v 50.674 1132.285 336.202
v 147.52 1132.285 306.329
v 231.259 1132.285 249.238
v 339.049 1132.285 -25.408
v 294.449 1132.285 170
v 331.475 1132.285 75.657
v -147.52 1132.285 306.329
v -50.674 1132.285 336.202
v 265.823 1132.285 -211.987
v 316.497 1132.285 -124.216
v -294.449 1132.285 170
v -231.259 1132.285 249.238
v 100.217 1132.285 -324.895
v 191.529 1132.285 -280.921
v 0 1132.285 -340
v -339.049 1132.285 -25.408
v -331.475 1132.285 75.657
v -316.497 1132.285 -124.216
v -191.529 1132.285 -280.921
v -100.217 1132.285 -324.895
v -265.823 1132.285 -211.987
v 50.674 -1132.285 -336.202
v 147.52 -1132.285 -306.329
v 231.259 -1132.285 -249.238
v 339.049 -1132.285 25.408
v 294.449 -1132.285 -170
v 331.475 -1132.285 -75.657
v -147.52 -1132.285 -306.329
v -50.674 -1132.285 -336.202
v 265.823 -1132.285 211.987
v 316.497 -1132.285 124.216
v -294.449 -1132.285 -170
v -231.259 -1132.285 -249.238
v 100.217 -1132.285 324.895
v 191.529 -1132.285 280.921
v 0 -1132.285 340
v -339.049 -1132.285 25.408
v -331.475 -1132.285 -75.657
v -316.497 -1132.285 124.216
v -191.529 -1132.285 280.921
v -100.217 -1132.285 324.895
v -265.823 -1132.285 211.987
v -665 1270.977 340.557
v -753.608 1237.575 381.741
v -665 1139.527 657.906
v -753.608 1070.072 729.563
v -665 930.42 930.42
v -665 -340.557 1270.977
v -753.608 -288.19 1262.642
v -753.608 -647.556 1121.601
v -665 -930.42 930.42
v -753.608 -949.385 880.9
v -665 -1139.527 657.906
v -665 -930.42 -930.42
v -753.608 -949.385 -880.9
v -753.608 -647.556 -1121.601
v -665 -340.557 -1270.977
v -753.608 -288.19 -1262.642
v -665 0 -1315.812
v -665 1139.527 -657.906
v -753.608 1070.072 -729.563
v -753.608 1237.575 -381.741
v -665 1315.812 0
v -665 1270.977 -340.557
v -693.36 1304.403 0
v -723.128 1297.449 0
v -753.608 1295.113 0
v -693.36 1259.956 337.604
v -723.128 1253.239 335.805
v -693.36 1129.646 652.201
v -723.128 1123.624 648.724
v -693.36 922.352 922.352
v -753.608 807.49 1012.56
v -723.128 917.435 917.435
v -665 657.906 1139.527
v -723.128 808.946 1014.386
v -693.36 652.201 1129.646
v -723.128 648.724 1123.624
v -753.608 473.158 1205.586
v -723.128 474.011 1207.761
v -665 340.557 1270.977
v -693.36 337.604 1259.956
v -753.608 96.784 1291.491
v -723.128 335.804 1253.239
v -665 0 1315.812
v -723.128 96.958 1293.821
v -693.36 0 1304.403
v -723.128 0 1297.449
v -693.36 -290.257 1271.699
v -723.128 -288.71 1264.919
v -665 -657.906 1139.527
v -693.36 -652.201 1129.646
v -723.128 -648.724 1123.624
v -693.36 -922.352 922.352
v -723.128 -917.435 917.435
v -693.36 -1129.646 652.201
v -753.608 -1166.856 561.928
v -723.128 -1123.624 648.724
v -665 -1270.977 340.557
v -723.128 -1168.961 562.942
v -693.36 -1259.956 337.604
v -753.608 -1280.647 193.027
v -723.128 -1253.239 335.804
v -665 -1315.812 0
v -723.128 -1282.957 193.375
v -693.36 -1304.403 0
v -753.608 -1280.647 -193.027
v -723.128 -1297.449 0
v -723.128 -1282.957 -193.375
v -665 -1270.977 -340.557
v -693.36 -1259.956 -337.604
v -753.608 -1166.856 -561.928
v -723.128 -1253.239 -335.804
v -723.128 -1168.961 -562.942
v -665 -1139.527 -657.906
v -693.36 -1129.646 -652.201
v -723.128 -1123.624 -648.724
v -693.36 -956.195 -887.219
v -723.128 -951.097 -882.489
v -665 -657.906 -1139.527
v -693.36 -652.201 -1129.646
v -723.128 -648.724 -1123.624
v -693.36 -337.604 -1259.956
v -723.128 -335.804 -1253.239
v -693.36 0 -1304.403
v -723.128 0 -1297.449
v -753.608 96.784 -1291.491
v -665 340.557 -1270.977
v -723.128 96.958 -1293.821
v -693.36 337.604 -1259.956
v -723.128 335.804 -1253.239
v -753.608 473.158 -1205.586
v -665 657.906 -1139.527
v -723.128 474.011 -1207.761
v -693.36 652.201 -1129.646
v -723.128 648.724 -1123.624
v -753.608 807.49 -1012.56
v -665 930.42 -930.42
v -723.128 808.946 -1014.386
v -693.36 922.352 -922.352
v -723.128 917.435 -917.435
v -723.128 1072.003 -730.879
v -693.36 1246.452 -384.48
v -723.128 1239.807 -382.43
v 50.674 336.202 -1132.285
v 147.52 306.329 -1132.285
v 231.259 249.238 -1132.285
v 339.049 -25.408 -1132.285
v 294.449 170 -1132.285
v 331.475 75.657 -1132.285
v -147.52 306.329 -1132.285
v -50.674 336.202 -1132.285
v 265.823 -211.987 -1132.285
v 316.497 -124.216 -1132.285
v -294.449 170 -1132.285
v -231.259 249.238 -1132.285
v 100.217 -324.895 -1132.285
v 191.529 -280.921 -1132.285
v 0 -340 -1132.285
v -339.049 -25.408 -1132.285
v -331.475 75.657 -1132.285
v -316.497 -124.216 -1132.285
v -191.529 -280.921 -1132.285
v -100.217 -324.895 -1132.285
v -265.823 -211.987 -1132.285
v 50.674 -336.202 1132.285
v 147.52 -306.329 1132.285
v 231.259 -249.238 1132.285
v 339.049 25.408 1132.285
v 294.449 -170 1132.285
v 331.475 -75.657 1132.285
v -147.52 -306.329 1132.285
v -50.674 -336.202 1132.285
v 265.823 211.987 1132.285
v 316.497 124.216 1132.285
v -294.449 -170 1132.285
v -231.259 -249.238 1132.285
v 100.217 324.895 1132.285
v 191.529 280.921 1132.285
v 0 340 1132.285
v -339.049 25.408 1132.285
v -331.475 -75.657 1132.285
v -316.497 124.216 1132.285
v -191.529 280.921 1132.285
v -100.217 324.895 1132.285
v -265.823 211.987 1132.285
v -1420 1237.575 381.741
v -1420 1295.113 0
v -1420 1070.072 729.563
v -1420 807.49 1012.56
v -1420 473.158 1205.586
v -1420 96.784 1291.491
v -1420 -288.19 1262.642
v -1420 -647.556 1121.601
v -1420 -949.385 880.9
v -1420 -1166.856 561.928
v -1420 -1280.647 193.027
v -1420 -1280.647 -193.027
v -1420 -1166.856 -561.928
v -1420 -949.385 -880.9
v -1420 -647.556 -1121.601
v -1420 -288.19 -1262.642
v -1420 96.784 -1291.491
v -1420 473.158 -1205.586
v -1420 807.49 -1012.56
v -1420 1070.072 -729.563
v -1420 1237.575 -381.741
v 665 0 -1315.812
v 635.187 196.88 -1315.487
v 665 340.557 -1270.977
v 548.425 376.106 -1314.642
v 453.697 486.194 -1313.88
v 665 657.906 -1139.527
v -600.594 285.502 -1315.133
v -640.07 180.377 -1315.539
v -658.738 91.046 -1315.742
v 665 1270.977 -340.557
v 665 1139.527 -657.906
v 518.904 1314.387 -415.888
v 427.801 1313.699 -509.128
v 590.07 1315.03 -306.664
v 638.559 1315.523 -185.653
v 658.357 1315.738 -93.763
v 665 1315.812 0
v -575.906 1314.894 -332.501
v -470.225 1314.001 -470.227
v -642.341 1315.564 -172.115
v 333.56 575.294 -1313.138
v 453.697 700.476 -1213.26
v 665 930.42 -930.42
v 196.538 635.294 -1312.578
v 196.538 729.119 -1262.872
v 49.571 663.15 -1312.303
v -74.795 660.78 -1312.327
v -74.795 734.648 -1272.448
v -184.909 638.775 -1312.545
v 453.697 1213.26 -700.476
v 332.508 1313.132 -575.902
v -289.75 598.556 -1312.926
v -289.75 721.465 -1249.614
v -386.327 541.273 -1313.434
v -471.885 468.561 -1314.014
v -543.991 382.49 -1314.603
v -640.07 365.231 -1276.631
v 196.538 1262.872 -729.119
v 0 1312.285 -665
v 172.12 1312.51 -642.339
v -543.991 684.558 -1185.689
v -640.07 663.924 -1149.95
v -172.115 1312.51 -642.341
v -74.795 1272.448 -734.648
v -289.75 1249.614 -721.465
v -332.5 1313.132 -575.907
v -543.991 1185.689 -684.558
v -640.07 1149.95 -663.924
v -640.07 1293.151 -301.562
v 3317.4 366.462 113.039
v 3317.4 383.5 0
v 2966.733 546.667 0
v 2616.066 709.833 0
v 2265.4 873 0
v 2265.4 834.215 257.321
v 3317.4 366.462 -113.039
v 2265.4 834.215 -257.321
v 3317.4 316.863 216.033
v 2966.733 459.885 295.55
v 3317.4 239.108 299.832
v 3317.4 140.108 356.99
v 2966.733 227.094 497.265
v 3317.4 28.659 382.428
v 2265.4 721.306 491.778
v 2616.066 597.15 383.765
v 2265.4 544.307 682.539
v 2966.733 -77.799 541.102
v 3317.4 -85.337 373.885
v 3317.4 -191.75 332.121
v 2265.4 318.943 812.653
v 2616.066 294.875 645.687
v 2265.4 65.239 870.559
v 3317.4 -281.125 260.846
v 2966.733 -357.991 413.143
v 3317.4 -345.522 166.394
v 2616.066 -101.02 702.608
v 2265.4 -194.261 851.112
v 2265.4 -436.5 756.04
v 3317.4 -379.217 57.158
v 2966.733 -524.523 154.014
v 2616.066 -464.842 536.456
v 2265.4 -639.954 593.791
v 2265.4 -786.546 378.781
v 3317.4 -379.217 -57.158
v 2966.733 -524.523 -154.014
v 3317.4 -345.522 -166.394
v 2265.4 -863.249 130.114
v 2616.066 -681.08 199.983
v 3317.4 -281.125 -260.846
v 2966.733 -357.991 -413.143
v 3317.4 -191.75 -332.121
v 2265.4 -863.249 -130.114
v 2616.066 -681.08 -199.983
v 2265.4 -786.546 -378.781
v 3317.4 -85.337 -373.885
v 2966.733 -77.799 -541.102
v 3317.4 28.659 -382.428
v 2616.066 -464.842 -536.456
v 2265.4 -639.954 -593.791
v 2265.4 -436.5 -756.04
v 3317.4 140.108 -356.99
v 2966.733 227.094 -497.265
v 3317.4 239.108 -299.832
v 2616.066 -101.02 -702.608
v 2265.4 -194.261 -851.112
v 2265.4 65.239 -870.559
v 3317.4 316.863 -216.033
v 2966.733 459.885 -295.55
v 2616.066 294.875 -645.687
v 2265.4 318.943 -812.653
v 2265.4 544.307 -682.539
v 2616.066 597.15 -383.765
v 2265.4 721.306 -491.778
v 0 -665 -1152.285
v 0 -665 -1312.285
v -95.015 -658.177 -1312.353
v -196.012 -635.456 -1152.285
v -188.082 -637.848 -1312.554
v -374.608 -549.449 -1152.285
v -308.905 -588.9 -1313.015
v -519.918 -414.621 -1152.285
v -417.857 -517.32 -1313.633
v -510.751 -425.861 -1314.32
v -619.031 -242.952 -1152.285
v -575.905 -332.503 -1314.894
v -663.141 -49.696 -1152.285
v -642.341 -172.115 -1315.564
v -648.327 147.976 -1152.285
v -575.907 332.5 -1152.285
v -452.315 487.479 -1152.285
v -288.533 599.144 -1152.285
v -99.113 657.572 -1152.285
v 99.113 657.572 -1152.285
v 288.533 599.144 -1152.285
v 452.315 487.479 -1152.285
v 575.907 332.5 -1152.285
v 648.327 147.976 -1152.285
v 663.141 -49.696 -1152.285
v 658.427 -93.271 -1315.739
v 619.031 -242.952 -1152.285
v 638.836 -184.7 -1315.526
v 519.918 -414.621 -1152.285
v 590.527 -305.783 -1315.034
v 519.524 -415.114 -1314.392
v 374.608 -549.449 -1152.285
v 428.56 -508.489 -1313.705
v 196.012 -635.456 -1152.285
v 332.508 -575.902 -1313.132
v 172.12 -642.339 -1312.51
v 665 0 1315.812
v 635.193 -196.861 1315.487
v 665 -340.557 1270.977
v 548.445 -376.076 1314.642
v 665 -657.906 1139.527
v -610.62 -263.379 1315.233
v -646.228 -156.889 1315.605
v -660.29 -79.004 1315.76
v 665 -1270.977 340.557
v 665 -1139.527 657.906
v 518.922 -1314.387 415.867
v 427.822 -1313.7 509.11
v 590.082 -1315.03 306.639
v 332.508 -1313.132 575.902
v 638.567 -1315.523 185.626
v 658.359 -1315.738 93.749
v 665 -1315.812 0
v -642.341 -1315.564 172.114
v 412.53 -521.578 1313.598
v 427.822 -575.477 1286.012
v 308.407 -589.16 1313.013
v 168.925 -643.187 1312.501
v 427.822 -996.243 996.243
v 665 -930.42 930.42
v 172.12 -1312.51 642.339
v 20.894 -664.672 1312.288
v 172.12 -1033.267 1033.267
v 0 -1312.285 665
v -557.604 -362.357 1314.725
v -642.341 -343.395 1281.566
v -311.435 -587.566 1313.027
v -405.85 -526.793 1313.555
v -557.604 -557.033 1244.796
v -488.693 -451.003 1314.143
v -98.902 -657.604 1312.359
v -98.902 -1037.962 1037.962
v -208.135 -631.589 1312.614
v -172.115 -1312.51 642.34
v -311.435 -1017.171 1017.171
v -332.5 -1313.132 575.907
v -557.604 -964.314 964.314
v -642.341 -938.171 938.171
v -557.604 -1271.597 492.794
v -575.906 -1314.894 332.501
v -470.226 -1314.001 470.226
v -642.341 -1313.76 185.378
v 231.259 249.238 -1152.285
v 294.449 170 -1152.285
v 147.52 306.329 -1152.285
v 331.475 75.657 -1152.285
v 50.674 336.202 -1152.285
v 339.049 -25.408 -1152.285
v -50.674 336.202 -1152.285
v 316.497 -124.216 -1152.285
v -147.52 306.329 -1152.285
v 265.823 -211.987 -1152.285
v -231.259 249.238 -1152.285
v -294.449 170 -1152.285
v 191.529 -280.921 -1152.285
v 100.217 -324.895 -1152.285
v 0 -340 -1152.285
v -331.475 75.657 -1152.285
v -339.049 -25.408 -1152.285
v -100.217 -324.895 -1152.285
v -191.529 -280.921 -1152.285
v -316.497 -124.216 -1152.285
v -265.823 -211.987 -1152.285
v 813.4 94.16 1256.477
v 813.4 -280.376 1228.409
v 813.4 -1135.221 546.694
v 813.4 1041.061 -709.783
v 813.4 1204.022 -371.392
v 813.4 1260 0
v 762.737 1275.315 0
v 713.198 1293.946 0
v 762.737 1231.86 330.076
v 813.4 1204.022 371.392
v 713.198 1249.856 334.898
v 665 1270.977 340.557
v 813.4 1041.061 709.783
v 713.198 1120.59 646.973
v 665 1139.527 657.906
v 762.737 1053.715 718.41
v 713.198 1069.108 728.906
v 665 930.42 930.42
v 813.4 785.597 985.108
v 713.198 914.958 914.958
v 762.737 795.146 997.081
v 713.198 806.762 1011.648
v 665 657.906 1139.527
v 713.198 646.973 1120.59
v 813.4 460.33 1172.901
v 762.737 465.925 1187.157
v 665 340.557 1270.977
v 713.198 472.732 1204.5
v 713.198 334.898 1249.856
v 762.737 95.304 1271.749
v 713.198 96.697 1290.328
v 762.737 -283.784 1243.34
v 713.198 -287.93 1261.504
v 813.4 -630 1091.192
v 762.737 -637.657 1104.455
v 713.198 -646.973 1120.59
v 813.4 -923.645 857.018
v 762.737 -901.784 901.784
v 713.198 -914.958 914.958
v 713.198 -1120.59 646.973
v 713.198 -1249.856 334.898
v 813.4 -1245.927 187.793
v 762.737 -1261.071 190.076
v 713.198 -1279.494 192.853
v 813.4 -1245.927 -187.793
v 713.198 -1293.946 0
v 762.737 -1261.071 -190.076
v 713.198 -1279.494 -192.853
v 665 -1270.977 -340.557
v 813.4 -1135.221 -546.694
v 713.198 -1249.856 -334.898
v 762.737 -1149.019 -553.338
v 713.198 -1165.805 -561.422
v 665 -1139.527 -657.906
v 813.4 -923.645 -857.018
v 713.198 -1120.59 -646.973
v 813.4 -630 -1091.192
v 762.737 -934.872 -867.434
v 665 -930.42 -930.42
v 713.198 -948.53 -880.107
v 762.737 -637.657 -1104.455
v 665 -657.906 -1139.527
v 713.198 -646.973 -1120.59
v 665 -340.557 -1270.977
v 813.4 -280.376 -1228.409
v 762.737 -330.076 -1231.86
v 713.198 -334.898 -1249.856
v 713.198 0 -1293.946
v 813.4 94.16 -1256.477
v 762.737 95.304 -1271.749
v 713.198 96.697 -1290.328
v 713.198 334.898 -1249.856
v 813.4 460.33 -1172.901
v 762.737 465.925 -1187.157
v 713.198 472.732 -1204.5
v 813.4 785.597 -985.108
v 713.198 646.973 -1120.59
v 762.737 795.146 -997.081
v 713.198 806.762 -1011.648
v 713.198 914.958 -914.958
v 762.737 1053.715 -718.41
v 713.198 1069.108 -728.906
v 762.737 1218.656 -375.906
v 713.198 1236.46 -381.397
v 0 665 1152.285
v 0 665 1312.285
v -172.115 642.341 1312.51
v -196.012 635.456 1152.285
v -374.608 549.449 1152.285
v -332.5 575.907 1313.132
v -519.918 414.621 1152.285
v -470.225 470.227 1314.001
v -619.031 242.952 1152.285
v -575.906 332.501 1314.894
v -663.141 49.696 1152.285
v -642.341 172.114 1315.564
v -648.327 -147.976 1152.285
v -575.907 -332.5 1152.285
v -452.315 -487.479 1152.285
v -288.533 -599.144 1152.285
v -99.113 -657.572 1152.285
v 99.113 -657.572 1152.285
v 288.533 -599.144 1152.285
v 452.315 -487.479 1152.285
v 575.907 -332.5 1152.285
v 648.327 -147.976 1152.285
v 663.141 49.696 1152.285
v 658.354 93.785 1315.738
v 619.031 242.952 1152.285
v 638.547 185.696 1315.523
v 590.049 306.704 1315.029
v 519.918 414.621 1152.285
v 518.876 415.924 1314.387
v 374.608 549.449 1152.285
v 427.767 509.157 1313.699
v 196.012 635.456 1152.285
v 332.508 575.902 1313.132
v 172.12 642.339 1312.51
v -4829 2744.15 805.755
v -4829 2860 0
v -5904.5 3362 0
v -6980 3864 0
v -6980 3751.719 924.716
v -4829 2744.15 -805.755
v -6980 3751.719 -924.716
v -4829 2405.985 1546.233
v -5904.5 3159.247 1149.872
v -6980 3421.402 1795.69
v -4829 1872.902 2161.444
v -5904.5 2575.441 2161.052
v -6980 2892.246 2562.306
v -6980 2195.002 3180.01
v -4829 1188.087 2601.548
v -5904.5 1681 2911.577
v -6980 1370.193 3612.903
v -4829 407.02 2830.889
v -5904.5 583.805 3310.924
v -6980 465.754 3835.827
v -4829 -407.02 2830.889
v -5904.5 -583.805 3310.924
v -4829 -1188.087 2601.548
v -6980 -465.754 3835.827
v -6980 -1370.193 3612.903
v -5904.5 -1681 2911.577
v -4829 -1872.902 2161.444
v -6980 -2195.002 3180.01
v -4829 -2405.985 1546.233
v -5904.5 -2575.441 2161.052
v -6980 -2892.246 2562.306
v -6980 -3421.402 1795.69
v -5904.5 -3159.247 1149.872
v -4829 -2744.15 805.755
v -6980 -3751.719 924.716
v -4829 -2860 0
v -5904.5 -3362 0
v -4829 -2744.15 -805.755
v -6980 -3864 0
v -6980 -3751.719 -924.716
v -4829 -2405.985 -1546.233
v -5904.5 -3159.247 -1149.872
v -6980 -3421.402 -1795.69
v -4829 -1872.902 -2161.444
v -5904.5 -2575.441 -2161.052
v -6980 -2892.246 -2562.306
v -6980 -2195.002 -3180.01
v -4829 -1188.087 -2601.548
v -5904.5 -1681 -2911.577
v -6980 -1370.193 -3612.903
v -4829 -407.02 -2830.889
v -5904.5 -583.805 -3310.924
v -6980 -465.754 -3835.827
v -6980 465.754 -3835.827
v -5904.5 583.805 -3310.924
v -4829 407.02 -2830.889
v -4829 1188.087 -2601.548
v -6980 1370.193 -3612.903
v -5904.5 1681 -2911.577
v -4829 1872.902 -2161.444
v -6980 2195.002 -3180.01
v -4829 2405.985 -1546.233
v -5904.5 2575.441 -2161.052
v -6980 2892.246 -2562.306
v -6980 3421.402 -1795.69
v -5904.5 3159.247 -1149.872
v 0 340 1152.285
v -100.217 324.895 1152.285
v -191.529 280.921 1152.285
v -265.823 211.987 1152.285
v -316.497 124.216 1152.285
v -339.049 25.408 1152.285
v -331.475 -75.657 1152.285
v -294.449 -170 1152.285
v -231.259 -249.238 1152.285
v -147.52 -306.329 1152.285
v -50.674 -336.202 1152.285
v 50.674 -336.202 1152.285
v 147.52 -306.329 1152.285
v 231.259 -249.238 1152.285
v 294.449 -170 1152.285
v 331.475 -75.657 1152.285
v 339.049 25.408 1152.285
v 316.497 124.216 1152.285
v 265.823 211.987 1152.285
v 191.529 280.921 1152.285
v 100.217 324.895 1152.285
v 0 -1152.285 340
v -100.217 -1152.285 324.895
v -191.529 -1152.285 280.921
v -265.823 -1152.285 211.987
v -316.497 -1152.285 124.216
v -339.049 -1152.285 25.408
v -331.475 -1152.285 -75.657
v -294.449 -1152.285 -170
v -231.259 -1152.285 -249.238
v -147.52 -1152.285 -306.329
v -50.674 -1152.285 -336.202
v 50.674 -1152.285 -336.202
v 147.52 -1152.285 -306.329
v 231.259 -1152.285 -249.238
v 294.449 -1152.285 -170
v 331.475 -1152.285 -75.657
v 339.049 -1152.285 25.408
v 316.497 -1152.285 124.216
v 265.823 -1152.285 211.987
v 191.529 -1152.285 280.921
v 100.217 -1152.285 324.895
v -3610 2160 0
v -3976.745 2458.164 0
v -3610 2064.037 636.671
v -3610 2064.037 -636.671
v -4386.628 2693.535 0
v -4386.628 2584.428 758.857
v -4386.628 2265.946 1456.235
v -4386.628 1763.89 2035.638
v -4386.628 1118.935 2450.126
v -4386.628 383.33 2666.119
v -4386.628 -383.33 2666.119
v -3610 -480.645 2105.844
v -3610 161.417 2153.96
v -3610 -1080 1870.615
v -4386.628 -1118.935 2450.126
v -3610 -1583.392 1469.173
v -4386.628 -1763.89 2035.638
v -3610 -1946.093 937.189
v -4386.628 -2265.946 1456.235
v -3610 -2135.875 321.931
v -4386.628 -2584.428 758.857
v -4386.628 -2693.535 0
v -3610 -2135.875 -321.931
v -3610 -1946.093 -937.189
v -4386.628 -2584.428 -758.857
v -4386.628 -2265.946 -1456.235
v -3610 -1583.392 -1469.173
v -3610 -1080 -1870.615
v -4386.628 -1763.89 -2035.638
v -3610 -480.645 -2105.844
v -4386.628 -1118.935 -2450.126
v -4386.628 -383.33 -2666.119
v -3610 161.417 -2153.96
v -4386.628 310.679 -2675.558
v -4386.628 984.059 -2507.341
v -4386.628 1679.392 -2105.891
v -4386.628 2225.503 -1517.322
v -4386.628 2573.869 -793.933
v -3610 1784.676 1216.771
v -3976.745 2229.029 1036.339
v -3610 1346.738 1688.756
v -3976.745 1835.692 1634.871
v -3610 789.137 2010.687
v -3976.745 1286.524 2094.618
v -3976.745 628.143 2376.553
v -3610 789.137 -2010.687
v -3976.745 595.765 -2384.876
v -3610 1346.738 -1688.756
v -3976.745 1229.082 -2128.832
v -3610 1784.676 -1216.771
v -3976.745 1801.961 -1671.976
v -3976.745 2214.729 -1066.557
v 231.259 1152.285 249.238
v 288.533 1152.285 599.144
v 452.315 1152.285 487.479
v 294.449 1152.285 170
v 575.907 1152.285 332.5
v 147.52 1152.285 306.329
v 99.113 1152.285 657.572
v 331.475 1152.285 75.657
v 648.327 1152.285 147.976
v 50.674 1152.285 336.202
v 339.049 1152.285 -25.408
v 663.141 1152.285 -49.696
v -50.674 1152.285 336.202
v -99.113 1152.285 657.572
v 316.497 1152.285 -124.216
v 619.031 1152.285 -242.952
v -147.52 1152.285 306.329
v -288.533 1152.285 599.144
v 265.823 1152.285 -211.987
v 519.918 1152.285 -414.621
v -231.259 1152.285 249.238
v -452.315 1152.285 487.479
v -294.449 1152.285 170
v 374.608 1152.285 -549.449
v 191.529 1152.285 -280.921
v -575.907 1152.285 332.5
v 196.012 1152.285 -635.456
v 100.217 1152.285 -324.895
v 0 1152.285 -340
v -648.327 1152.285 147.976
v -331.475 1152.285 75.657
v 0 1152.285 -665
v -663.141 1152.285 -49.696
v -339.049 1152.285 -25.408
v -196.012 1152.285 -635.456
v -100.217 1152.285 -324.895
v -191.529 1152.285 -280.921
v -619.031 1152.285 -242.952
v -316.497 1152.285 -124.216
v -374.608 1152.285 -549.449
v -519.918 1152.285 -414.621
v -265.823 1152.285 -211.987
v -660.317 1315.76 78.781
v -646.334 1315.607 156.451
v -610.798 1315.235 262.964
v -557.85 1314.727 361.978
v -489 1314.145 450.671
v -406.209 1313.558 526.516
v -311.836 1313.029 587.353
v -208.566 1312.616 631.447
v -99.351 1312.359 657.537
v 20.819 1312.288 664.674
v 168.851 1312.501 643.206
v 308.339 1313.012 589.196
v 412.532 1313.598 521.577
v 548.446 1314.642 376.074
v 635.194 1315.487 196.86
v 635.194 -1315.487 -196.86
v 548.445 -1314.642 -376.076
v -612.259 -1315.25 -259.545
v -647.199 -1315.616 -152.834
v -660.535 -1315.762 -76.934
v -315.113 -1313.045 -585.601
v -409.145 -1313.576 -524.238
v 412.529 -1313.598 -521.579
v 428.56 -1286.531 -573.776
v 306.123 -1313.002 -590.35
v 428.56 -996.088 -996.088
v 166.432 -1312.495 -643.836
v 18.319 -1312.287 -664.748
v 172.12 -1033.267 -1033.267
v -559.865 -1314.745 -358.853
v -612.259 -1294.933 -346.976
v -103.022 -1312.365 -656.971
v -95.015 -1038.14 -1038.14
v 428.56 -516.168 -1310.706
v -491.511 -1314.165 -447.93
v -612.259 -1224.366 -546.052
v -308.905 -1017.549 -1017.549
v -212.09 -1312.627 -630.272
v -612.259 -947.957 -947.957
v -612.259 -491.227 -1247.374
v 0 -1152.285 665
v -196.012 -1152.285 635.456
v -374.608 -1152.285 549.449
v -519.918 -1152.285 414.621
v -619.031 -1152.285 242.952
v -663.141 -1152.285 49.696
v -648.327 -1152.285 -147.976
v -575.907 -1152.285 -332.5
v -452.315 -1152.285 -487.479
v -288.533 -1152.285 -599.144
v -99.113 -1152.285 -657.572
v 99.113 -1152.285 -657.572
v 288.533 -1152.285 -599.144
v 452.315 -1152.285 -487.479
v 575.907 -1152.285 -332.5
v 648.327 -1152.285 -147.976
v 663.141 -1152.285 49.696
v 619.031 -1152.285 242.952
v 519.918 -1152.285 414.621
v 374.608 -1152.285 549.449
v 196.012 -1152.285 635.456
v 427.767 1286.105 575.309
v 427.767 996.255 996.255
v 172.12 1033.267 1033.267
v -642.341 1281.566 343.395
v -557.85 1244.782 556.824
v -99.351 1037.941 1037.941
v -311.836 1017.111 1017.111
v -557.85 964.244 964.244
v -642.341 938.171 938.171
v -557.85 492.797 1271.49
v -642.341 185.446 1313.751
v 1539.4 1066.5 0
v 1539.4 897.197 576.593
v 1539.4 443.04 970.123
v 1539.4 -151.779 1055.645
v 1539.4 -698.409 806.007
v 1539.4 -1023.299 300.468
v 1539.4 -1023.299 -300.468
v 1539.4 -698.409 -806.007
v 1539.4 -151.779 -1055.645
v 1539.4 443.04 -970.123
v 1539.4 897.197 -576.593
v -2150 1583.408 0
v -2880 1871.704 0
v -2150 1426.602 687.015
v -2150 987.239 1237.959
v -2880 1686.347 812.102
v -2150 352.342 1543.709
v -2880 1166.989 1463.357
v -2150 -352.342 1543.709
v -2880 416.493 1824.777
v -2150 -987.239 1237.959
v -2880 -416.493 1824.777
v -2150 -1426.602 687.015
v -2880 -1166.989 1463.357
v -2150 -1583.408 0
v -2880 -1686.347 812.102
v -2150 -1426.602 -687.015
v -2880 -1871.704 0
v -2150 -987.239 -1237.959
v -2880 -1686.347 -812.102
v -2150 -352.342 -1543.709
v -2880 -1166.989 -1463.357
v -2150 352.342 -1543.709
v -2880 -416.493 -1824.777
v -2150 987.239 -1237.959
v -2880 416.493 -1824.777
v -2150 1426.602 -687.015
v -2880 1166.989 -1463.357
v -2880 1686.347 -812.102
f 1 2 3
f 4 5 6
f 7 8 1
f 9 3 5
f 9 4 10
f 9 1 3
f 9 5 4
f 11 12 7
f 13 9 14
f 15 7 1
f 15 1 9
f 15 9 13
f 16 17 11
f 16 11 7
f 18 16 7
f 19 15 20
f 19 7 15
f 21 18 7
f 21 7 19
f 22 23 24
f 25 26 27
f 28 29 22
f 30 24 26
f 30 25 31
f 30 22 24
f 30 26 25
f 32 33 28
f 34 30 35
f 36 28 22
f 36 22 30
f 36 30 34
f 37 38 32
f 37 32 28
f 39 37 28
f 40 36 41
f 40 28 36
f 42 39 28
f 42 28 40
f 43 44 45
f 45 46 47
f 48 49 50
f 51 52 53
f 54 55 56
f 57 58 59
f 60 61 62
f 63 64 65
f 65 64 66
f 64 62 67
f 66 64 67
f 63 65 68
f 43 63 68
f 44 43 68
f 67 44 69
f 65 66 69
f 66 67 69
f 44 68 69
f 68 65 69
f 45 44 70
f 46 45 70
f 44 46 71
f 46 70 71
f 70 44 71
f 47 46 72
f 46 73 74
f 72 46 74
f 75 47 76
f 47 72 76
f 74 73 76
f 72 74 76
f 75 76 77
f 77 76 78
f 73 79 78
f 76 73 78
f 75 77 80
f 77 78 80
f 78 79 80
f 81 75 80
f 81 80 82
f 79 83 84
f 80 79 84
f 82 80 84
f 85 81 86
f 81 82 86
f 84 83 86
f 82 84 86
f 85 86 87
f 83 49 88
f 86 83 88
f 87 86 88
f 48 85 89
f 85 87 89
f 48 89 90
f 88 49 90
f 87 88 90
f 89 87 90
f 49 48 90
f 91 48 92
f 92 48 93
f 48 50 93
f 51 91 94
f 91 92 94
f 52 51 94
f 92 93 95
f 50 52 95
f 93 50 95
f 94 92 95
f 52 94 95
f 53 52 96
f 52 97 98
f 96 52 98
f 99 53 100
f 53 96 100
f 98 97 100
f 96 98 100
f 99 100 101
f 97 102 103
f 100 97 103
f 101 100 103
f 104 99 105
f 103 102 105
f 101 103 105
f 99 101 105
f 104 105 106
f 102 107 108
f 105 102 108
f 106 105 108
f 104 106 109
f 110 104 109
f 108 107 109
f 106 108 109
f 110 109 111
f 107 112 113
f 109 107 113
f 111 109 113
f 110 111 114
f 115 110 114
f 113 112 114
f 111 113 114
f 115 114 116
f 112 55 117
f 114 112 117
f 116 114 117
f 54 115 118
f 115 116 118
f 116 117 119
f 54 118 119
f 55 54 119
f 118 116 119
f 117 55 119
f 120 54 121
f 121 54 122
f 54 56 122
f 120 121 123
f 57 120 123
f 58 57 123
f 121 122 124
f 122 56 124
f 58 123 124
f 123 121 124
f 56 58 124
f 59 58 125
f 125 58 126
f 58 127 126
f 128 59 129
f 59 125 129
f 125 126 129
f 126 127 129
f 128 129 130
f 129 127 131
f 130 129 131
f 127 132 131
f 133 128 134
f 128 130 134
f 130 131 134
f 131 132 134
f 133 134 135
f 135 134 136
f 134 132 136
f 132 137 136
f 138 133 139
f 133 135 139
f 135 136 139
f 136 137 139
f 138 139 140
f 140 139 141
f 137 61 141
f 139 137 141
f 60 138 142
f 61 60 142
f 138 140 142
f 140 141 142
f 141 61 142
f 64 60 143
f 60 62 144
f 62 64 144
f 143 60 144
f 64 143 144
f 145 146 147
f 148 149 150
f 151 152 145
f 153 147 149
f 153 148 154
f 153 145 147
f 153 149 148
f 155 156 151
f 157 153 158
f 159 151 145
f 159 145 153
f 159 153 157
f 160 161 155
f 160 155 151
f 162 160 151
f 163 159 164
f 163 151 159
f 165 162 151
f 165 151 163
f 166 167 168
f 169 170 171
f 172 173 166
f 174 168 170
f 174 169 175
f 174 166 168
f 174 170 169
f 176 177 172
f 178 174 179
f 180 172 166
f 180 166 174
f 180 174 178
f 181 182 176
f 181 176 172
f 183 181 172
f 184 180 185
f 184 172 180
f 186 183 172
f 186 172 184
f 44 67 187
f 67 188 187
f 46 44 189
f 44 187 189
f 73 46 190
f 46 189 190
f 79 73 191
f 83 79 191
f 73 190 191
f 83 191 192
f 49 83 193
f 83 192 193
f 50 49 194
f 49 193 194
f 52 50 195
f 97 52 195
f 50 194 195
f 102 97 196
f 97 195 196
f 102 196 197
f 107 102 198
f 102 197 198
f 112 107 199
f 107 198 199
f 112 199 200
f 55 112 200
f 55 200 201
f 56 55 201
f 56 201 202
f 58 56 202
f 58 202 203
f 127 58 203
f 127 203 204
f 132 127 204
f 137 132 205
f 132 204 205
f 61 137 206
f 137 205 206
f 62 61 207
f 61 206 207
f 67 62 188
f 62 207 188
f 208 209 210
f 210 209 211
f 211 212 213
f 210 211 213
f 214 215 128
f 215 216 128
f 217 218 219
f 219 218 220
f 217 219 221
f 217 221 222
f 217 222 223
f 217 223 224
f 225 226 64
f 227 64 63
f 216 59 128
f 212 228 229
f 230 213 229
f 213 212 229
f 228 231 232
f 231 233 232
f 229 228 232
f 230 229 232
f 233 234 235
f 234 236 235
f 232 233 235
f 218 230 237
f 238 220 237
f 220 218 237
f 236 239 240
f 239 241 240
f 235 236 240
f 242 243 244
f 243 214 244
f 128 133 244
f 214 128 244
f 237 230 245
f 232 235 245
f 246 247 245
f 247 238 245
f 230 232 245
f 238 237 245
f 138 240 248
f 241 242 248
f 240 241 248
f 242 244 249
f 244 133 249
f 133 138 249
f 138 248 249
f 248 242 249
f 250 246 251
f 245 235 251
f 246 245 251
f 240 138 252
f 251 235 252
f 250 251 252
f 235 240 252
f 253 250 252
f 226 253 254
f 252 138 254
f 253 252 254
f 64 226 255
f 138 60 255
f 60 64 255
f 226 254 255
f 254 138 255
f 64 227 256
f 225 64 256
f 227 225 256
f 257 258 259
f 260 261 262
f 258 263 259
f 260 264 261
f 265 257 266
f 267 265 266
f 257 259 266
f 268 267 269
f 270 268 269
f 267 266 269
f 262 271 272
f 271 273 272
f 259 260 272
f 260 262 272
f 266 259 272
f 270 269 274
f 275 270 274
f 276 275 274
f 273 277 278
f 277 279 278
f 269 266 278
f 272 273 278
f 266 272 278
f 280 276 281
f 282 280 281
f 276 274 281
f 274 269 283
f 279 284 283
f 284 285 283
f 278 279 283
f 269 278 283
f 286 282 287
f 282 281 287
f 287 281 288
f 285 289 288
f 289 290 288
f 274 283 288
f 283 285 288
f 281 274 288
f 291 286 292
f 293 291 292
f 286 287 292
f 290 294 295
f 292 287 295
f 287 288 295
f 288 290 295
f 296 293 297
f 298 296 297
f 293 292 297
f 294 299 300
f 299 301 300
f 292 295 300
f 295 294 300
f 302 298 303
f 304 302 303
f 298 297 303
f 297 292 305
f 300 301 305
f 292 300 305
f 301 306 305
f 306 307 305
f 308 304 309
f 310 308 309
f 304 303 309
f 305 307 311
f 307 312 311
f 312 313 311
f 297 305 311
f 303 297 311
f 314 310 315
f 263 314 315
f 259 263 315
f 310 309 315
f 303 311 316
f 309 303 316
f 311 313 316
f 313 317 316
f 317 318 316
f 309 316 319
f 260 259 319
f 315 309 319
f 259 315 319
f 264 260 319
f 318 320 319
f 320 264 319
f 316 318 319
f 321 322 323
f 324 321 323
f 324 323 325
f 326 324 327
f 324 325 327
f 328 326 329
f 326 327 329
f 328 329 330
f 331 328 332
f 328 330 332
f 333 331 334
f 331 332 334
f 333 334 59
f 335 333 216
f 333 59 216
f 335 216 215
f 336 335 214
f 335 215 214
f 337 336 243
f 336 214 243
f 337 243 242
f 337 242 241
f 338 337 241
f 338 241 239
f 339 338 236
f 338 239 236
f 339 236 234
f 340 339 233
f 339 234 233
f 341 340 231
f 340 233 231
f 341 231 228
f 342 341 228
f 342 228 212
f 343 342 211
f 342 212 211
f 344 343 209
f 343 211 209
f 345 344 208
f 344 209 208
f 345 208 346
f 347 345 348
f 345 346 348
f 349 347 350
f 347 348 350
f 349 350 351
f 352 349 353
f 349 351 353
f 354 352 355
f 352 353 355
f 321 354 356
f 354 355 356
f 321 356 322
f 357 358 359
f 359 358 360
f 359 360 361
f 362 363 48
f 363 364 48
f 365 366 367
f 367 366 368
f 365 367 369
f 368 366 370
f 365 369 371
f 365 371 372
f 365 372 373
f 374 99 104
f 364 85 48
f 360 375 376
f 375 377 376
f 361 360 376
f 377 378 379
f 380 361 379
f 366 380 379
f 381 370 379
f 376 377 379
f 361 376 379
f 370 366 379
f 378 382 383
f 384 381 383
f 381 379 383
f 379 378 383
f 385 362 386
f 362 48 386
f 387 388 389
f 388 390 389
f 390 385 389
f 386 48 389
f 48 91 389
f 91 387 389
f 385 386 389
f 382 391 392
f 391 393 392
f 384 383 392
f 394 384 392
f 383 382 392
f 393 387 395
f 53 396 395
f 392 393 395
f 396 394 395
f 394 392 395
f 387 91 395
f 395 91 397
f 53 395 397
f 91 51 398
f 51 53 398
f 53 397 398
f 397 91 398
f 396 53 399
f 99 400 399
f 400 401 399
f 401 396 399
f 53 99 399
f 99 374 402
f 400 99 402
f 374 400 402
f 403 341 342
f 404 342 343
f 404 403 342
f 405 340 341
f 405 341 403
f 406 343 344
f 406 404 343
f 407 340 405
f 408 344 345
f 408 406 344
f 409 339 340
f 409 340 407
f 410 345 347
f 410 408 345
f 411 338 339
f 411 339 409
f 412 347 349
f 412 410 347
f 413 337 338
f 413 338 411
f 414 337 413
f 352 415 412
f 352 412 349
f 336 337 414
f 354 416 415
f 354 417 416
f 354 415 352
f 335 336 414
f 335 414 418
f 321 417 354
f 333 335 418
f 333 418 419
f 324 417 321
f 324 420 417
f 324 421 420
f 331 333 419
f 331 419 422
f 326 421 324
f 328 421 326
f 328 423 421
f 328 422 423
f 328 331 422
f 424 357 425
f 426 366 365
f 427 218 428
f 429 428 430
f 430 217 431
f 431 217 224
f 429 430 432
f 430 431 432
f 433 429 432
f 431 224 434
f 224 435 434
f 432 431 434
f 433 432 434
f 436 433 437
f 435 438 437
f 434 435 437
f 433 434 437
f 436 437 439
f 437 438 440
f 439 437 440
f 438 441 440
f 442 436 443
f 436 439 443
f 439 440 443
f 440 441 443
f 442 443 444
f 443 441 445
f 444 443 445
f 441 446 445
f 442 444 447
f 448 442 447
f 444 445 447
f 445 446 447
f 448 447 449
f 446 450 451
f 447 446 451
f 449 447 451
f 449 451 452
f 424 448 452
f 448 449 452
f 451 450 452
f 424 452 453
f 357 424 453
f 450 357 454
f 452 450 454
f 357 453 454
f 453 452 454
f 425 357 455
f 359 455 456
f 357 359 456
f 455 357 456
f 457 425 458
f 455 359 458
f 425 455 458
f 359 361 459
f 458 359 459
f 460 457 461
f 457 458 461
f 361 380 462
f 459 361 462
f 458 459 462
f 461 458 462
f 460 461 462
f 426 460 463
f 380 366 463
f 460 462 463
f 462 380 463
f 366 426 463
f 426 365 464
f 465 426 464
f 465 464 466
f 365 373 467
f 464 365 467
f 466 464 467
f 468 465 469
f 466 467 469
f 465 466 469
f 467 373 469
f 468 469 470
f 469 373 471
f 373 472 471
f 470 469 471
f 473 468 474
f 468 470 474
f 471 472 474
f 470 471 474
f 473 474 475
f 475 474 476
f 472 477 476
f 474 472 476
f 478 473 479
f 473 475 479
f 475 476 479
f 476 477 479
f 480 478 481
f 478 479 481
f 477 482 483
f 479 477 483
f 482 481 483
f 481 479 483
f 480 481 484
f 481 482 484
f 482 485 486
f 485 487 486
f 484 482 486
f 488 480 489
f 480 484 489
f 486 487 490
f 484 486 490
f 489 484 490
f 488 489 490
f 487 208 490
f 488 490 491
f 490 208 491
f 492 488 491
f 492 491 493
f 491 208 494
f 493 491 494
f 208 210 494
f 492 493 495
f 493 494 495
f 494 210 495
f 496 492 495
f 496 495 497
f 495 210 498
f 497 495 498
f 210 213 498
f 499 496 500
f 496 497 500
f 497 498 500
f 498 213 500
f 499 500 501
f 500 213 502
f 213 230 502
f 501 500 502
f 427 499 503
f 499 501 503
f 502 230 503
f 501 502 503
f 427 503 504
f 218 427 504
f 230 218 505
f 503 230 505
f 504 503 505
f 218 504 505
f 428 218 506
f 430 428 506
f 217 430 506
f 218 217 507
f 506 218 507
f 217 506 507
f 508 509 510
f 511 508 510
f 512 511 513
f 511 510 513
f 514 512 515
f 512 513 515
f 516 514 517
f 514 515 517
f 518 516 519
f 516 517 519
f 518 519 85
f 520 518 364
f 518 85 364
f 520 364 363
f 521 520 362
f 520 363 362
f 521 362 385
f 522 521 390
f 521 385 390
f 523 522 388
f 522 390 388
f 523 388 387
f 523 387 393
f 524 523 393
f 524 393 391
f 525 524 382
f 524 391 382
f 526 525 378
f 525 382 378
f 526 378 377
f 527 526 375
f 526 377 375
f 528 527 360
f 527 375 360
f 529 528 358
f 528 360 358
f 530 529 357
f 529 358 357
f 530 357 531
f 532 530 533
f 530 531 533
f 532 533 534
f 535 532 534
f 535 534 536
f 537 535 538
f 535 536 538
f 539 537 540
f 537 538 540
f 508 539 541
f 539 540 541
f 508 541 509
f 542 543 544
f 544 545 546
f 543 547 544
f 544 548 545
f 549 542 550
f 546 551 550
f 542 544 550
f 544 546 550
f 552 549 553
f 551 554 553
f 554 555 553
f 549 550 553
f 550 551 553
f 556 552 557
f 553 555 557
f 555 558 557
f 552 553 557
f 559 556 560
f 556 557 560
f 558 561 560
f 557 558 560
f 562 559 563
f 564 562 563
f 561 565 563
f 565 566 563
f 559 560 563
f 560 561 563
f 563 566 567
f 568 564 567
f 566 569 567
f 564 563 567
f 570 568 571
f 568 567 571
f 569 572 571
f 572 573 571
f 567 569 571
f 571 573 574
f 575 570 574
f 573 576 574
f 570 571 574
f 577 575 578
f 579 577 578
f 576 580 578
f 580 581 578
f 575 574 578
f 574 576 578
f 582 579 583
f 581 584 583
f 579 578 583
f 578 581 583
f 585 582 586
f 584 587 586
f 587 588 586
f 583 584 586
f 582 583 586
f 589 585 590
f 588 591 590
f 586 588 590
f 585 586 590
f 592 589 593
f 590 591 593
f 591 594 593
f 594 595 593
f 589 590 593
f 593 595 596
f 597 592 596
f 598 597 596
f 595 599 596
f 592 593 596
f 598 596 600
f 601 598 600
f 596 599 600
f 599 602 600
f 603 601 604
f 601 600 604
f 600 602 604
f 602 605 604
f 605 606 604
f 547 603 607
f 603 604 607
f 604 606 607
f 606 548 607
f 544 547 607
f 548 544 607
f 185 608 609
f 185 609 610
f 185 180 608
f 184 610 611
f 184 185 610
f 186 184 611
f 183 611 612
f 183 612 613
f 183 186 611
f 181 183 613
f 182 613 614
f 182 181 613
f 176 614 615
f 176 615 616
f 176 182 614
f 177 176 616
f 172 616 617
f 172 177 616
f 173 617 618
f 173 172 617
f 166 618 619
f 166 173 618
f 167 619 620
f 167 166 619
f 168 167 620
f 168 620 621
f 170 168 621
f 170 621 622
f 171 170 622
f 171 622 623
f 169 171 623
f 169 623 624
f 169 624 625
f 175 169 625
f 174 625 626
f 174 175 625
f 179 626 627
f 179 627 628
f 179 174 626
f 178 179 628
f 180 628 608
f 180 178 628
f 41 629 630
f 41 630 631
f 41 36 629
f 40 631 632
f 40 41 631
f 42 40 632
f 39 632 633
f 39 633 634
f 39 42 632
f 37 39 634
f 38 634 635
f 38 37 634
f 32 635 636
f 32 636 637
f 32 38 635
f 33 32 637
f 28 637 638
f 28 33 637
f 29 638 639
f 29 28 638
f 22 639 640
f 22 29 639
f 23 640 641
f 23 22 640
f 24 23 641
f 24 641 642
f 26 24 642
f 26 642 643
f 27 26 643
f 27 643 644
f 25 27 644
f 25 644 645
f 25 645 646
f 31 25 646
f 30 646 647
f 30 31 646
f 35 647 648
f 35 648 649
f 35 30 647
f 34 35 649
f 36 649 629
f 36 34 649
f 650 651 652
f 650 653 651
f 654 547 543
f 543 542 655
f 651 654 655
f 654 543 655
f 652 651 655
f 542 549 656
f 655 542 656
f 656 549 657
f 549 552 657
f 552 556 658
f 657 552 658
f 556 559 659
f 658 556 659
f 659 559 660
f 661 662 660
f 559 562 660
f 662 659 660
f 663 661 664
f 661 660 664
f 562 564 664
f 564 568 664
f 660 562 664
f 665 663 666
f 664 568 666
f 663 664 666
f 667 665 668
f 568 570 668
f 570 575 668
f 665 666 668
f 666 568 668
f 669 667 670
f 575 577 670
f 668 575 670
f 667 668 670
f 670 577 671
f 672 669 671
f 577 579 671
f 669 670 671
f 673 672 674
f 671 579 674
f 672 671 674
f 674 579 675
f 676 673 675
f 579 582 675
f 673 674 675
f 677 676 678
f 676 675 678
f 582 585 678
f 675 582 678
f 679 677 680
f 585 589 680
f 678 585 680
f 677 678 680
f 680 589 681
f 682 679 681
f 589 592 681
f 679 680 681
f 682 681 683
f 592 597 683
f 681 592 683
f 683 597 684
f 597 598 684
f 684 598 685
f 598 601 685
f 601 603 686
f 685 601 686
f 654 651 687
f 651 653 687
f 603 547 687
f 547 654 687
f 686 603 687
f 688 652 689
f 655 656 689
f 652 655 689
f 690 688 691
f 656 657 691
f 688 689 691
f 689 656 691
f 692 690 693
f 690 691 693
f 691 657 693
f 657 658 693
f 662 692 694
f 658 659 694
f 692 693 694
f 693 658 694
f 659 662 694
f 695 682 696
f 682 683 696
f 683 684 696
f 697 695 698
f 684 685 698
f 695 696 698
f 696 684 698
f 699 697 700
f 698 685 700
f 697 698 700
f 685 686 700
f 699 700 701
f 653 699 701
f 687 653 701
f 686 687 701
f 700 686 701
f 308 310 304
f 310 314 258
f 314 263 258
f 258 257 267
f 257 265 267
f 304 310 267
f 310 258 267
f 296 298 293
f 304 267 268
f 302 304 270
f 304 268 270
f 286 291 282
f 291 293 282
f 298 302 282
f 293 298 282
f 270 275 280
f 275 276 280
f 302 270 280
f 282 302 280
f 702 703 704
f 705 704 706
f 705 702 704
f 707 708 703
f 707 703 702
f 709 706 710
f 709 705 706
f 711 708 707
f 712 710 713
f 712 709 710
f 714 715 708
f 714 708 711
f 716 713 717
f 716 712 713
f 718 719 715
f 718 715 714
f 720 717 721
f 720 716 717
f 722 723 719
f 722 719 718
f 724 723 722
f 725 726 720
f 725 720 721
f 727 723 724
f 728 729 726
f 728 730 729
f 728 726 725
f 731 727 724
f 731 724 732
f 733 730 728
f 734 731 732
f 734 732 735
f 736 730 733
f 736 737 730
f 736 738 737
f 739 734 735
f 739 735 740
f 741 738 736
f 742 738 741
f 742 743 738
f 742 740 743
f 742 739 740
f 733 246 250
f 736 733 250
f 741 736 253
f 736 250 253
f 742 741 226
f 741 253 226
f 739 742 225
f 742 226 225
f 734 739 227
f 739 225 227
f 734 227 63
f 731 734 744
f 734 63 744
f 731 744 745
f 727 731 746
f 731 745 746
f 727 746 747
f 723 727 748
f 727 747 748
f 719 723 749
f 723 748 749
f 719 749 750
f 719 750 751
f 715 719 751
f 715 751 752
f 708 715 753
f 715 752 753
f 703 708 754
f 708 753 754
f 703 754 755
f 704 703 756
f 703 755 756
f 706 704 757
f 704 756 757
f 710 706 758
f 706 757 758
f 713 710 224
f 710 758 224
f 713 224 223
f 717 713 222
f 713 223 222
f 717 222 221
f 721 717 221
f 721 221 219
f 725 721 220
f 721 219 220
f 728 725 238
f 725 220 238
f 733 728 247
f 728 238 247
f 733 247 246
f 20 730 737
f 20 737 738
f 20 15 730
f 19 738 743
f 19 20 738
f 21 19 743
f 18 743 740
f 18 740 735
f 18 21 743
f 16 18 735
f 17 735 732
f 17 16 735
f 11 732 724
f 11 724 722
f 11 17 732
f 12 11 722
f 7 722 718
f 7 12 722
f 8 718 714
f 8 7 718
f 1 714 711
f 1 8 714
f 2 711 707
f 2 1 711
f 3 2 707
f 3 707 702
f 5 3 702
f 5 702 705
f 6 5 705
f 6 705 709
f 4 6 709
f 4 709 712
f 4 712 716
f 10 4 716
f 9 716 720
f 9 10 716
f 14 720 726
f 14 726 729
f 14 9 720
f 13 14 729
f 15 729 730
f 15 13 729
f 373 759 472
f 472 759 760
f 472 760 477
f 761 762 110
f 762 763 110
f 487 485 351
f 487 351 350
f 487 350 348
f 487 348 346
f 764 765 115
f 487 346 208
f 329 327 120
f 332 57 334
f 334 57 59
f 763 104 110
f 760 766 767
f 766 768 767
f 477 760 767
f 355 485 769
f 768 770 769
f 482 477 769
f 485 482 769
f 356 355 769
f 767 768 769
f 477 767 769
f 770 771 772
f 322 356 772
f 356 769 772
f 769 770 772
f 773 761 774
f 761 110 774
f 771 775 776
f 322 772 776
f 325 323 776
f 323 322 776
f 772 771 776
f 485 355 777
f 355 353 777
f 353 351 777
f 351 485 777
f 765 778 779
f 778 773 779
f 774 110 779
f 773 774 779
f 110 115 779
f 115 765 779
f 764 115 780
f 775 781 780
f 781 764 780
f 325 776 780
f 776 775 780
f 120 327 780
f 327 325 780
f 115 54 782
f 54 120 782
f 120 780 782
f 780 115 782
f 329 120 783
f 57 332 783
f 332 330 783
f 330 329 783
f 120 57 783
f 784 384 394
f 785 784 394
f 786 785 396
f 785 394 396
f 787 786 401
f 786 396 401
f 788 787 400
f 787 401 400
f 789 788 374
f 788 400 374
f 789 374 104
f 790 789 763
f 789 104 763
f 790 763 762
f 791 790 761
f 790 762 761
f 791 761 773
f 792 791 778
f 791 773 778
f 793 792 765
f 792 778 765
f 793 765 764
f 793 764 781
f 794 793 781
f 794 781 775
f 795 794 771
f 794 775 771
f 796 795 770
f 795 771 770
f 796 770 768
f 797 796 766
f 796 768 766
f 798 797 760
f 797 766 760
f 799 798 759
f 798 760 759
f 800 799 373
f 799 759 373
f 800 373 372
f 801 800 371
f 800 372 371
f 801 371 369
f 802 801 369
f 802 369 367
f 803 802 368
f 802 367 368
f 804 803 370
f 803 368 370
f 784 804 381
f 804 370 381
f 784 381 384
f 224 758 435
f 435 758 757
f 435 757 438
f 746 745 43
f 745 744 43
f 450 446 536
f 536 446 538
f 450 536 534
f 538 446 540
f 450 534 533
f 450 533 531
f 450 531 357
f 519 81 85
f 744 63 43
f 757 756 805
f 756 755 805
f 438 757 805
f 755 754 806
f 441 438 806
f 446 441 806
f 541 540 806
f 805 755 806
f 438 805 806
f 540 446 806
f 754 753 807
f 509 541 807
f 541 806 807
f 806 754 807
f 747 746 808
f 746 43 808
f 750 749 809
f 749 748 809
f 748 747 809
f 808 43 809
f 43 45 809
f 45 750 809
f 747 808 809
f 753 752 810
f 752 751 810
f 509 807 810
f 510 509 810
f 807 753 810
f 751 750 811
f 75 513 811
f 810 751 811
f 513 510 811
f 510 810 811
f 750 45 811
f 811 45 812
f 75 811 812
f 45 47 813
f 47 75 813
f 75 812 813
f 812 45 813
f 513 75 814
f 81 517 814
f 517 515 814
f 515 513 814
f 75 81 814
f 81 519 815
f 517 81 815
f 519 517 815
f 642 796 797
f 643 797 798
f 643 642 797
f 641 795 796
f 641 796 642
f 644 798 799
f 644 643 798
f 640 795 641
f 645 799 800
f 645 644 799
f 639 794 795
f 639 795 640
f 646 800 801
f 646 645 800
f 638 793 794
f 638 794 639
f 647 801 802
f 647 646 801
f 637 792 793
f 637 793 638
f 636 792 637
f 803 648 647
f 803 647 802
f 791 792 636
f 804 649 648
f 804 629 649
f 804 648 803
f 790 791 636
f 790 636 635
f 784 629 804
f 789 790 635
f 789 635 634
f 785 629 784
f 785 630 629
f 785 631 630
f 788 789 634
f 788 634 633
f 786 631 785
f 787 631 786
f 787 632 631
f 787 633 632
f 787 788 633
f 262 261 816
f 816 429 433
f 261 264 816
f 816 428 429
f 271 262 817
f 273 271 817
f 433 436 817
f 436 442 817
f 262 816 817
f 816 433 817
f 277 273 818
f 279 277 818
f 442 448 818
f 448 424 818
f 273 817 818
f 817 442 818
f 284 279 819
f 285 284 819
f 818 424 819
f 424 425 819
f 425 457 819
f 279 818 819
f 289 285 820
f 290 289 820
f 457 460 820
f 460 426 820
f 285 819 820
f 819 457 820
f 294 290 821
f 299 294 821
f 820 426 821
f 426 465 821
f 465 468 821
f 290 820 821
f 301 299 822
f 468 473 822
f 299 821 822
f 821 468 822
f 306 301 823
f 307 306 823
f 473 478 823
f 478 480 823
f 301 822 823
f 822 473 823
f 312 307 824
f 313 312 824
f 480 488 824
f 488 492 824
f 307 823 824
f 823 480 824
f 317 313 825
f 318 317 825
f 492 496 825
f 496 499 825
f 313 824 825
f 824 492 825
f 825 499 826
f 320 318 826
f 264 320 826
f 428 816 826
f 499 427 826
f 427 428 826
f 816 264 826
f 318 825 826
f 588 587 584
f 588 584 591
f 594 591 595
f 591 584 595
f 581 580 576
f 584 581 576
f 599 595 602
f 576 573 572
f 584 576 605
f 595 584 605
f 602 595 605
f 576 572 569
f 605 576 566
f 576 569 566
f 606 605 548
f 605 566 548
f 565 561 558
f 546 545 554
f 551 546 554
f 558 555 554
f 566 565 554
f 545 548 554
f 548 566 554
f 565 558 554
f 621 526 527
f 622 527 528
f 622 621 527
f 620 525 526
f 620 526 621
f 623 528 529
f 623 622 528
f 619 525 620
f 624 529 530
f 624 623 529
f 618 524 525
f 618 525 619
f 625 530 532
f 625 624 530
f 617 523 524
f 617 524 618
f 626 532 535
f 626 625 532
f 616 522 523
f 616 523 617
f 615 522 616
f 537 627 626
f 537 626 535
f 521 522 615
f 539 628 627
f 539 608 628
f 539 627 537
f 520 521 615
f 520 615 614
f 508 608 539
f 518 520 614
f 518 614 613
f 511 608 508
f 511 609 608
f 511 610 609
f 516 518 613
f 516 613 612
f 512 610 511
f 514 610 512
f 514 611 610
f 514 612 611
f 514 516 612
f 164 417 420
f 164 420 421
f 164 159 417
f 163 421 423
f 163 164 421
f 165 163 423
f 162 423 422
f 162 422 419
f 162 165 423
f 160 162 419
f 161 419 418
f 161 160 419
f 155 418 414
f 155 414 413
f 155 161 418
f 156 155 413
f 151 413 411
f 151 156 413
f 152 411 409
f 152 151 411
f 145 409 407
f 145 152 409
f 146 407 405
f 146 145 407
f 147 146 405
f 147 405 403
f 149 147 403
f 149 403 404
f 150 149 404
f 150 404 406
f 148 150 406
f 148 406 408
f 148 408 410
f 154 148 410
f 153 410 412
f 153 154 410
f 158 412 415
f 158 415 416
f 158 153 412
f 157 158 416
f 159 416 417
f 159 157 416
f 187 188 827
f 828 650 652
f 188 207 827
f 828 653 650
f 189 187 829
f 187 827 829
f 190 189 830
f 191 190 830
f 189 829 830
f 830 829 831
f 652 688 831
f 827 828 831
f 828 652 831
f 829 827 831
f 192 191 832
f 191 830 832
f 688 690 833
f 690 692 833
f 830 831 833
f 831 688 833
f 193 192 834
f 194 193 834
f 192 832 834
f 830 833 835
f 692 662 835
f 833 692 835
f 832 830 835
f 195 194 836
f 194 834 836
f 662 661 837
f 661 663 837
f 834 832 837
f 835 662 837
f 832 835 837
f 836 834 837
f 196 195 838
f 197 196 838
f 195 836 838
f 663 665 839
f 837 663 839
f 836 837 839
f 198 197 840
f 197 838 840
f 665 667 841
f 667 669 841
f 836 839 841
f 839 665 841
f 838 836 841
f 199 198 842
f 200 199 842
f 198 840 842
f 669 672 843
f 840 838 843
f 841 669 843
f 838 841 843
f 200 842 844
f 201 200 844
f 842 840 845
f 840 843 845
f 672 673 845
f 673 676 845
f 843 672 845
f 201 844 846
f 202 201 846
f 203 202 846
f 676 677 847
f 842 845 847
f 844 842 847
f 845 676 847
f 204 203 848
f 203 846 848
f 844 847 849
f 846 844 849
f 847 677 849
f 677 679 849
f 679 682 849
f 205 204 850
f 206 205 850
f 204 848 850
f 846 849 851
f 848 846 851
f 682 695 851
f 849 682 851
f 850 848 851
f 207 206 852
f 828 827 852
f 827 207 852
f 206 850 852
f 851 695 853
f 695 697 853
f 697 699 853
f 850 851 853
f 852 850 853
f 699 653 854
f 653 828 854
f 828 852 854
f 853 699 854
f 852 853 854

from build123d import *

# Parameters (mm, degrees)
PADR_OCIRCULAR1_COUNT = 4


with BuildPart() as part:
    # Esboço1 → Revolução1 (revolve)
    with BuildSketch(Plane.XY):
        with BuildLine():
            Line((3317.399667889, 0), (3317.399667889, 383.5))
            Line((3317.399667889, 383.5), (2265.399667889, 873))
            Line((2265.399667889, 873), (813.399667889, 1260))
            ThreePointArc((813.399667889, 1260), (737.813781205, 1284.220696189), (665, 1315.812176946))
            ThreePointArc((665, 1315.812176946), (0, 1471.161405015), (-665, 1315.812176946))
            ThreePointArc((-665, 1315.812176946), (-708.110967822, 1300.356342101), (-753.607594937, 1295.112746158))
            Line((-753.607594937, 1295.112746158), (-1420, 1295.112746158))
            Line((-1420, 1295.112746158), (-3610, 2160))
            ThreePointArc((-3610, 2160), (-4176.936739119, 2584.120878591), (-4829, 2860))
            Line((-4829, 2860), (-6980, 3864))
            Line((-6980, 3864), (-6980, 0))
            Line((-6980, 0), (3317.399667889, 0))
        make_face()
    revolve(axis=Axis((-6980, 0, 0), (1, 0, 0)))

    # Esboço2 → Corte-Revolução7 (revolve, cut)
    with BuildSketch(Plane(origin=(0, 0, 0), x_dir=(0, 0, -1), z_dir=(1, 0, 0))):
        Polygon((665, 1312.284603127), (665, 1152.284603127), (340, 1152.284603127), (340, 1132.284603127), (0, 1132.284603127), (0, 1471.161405015), (0, 1794.497439154), (665, 1794.497439154), align=None)
    corte_revolu_o7 = revolve(axis=Axis((0, 0, 0), (0, 1, 0)), mode=Mode.SUBTRACT)

    # PadrãoCircular1: Corte-Revolução7 ×4 about axis
    padr_ocircular1_axis = Axis((0, 0, 0), (1, 0, 0))
    for i in range(1, PADR_OCIRCULAR1_COUNT):
        add(corte_revolu_o7.rotate(padr_ocircular1_axis, i * 360 / PADR_OCIRCULAR1_COUNT), mode=Mode.SUBTRACT)


solid = part.part
